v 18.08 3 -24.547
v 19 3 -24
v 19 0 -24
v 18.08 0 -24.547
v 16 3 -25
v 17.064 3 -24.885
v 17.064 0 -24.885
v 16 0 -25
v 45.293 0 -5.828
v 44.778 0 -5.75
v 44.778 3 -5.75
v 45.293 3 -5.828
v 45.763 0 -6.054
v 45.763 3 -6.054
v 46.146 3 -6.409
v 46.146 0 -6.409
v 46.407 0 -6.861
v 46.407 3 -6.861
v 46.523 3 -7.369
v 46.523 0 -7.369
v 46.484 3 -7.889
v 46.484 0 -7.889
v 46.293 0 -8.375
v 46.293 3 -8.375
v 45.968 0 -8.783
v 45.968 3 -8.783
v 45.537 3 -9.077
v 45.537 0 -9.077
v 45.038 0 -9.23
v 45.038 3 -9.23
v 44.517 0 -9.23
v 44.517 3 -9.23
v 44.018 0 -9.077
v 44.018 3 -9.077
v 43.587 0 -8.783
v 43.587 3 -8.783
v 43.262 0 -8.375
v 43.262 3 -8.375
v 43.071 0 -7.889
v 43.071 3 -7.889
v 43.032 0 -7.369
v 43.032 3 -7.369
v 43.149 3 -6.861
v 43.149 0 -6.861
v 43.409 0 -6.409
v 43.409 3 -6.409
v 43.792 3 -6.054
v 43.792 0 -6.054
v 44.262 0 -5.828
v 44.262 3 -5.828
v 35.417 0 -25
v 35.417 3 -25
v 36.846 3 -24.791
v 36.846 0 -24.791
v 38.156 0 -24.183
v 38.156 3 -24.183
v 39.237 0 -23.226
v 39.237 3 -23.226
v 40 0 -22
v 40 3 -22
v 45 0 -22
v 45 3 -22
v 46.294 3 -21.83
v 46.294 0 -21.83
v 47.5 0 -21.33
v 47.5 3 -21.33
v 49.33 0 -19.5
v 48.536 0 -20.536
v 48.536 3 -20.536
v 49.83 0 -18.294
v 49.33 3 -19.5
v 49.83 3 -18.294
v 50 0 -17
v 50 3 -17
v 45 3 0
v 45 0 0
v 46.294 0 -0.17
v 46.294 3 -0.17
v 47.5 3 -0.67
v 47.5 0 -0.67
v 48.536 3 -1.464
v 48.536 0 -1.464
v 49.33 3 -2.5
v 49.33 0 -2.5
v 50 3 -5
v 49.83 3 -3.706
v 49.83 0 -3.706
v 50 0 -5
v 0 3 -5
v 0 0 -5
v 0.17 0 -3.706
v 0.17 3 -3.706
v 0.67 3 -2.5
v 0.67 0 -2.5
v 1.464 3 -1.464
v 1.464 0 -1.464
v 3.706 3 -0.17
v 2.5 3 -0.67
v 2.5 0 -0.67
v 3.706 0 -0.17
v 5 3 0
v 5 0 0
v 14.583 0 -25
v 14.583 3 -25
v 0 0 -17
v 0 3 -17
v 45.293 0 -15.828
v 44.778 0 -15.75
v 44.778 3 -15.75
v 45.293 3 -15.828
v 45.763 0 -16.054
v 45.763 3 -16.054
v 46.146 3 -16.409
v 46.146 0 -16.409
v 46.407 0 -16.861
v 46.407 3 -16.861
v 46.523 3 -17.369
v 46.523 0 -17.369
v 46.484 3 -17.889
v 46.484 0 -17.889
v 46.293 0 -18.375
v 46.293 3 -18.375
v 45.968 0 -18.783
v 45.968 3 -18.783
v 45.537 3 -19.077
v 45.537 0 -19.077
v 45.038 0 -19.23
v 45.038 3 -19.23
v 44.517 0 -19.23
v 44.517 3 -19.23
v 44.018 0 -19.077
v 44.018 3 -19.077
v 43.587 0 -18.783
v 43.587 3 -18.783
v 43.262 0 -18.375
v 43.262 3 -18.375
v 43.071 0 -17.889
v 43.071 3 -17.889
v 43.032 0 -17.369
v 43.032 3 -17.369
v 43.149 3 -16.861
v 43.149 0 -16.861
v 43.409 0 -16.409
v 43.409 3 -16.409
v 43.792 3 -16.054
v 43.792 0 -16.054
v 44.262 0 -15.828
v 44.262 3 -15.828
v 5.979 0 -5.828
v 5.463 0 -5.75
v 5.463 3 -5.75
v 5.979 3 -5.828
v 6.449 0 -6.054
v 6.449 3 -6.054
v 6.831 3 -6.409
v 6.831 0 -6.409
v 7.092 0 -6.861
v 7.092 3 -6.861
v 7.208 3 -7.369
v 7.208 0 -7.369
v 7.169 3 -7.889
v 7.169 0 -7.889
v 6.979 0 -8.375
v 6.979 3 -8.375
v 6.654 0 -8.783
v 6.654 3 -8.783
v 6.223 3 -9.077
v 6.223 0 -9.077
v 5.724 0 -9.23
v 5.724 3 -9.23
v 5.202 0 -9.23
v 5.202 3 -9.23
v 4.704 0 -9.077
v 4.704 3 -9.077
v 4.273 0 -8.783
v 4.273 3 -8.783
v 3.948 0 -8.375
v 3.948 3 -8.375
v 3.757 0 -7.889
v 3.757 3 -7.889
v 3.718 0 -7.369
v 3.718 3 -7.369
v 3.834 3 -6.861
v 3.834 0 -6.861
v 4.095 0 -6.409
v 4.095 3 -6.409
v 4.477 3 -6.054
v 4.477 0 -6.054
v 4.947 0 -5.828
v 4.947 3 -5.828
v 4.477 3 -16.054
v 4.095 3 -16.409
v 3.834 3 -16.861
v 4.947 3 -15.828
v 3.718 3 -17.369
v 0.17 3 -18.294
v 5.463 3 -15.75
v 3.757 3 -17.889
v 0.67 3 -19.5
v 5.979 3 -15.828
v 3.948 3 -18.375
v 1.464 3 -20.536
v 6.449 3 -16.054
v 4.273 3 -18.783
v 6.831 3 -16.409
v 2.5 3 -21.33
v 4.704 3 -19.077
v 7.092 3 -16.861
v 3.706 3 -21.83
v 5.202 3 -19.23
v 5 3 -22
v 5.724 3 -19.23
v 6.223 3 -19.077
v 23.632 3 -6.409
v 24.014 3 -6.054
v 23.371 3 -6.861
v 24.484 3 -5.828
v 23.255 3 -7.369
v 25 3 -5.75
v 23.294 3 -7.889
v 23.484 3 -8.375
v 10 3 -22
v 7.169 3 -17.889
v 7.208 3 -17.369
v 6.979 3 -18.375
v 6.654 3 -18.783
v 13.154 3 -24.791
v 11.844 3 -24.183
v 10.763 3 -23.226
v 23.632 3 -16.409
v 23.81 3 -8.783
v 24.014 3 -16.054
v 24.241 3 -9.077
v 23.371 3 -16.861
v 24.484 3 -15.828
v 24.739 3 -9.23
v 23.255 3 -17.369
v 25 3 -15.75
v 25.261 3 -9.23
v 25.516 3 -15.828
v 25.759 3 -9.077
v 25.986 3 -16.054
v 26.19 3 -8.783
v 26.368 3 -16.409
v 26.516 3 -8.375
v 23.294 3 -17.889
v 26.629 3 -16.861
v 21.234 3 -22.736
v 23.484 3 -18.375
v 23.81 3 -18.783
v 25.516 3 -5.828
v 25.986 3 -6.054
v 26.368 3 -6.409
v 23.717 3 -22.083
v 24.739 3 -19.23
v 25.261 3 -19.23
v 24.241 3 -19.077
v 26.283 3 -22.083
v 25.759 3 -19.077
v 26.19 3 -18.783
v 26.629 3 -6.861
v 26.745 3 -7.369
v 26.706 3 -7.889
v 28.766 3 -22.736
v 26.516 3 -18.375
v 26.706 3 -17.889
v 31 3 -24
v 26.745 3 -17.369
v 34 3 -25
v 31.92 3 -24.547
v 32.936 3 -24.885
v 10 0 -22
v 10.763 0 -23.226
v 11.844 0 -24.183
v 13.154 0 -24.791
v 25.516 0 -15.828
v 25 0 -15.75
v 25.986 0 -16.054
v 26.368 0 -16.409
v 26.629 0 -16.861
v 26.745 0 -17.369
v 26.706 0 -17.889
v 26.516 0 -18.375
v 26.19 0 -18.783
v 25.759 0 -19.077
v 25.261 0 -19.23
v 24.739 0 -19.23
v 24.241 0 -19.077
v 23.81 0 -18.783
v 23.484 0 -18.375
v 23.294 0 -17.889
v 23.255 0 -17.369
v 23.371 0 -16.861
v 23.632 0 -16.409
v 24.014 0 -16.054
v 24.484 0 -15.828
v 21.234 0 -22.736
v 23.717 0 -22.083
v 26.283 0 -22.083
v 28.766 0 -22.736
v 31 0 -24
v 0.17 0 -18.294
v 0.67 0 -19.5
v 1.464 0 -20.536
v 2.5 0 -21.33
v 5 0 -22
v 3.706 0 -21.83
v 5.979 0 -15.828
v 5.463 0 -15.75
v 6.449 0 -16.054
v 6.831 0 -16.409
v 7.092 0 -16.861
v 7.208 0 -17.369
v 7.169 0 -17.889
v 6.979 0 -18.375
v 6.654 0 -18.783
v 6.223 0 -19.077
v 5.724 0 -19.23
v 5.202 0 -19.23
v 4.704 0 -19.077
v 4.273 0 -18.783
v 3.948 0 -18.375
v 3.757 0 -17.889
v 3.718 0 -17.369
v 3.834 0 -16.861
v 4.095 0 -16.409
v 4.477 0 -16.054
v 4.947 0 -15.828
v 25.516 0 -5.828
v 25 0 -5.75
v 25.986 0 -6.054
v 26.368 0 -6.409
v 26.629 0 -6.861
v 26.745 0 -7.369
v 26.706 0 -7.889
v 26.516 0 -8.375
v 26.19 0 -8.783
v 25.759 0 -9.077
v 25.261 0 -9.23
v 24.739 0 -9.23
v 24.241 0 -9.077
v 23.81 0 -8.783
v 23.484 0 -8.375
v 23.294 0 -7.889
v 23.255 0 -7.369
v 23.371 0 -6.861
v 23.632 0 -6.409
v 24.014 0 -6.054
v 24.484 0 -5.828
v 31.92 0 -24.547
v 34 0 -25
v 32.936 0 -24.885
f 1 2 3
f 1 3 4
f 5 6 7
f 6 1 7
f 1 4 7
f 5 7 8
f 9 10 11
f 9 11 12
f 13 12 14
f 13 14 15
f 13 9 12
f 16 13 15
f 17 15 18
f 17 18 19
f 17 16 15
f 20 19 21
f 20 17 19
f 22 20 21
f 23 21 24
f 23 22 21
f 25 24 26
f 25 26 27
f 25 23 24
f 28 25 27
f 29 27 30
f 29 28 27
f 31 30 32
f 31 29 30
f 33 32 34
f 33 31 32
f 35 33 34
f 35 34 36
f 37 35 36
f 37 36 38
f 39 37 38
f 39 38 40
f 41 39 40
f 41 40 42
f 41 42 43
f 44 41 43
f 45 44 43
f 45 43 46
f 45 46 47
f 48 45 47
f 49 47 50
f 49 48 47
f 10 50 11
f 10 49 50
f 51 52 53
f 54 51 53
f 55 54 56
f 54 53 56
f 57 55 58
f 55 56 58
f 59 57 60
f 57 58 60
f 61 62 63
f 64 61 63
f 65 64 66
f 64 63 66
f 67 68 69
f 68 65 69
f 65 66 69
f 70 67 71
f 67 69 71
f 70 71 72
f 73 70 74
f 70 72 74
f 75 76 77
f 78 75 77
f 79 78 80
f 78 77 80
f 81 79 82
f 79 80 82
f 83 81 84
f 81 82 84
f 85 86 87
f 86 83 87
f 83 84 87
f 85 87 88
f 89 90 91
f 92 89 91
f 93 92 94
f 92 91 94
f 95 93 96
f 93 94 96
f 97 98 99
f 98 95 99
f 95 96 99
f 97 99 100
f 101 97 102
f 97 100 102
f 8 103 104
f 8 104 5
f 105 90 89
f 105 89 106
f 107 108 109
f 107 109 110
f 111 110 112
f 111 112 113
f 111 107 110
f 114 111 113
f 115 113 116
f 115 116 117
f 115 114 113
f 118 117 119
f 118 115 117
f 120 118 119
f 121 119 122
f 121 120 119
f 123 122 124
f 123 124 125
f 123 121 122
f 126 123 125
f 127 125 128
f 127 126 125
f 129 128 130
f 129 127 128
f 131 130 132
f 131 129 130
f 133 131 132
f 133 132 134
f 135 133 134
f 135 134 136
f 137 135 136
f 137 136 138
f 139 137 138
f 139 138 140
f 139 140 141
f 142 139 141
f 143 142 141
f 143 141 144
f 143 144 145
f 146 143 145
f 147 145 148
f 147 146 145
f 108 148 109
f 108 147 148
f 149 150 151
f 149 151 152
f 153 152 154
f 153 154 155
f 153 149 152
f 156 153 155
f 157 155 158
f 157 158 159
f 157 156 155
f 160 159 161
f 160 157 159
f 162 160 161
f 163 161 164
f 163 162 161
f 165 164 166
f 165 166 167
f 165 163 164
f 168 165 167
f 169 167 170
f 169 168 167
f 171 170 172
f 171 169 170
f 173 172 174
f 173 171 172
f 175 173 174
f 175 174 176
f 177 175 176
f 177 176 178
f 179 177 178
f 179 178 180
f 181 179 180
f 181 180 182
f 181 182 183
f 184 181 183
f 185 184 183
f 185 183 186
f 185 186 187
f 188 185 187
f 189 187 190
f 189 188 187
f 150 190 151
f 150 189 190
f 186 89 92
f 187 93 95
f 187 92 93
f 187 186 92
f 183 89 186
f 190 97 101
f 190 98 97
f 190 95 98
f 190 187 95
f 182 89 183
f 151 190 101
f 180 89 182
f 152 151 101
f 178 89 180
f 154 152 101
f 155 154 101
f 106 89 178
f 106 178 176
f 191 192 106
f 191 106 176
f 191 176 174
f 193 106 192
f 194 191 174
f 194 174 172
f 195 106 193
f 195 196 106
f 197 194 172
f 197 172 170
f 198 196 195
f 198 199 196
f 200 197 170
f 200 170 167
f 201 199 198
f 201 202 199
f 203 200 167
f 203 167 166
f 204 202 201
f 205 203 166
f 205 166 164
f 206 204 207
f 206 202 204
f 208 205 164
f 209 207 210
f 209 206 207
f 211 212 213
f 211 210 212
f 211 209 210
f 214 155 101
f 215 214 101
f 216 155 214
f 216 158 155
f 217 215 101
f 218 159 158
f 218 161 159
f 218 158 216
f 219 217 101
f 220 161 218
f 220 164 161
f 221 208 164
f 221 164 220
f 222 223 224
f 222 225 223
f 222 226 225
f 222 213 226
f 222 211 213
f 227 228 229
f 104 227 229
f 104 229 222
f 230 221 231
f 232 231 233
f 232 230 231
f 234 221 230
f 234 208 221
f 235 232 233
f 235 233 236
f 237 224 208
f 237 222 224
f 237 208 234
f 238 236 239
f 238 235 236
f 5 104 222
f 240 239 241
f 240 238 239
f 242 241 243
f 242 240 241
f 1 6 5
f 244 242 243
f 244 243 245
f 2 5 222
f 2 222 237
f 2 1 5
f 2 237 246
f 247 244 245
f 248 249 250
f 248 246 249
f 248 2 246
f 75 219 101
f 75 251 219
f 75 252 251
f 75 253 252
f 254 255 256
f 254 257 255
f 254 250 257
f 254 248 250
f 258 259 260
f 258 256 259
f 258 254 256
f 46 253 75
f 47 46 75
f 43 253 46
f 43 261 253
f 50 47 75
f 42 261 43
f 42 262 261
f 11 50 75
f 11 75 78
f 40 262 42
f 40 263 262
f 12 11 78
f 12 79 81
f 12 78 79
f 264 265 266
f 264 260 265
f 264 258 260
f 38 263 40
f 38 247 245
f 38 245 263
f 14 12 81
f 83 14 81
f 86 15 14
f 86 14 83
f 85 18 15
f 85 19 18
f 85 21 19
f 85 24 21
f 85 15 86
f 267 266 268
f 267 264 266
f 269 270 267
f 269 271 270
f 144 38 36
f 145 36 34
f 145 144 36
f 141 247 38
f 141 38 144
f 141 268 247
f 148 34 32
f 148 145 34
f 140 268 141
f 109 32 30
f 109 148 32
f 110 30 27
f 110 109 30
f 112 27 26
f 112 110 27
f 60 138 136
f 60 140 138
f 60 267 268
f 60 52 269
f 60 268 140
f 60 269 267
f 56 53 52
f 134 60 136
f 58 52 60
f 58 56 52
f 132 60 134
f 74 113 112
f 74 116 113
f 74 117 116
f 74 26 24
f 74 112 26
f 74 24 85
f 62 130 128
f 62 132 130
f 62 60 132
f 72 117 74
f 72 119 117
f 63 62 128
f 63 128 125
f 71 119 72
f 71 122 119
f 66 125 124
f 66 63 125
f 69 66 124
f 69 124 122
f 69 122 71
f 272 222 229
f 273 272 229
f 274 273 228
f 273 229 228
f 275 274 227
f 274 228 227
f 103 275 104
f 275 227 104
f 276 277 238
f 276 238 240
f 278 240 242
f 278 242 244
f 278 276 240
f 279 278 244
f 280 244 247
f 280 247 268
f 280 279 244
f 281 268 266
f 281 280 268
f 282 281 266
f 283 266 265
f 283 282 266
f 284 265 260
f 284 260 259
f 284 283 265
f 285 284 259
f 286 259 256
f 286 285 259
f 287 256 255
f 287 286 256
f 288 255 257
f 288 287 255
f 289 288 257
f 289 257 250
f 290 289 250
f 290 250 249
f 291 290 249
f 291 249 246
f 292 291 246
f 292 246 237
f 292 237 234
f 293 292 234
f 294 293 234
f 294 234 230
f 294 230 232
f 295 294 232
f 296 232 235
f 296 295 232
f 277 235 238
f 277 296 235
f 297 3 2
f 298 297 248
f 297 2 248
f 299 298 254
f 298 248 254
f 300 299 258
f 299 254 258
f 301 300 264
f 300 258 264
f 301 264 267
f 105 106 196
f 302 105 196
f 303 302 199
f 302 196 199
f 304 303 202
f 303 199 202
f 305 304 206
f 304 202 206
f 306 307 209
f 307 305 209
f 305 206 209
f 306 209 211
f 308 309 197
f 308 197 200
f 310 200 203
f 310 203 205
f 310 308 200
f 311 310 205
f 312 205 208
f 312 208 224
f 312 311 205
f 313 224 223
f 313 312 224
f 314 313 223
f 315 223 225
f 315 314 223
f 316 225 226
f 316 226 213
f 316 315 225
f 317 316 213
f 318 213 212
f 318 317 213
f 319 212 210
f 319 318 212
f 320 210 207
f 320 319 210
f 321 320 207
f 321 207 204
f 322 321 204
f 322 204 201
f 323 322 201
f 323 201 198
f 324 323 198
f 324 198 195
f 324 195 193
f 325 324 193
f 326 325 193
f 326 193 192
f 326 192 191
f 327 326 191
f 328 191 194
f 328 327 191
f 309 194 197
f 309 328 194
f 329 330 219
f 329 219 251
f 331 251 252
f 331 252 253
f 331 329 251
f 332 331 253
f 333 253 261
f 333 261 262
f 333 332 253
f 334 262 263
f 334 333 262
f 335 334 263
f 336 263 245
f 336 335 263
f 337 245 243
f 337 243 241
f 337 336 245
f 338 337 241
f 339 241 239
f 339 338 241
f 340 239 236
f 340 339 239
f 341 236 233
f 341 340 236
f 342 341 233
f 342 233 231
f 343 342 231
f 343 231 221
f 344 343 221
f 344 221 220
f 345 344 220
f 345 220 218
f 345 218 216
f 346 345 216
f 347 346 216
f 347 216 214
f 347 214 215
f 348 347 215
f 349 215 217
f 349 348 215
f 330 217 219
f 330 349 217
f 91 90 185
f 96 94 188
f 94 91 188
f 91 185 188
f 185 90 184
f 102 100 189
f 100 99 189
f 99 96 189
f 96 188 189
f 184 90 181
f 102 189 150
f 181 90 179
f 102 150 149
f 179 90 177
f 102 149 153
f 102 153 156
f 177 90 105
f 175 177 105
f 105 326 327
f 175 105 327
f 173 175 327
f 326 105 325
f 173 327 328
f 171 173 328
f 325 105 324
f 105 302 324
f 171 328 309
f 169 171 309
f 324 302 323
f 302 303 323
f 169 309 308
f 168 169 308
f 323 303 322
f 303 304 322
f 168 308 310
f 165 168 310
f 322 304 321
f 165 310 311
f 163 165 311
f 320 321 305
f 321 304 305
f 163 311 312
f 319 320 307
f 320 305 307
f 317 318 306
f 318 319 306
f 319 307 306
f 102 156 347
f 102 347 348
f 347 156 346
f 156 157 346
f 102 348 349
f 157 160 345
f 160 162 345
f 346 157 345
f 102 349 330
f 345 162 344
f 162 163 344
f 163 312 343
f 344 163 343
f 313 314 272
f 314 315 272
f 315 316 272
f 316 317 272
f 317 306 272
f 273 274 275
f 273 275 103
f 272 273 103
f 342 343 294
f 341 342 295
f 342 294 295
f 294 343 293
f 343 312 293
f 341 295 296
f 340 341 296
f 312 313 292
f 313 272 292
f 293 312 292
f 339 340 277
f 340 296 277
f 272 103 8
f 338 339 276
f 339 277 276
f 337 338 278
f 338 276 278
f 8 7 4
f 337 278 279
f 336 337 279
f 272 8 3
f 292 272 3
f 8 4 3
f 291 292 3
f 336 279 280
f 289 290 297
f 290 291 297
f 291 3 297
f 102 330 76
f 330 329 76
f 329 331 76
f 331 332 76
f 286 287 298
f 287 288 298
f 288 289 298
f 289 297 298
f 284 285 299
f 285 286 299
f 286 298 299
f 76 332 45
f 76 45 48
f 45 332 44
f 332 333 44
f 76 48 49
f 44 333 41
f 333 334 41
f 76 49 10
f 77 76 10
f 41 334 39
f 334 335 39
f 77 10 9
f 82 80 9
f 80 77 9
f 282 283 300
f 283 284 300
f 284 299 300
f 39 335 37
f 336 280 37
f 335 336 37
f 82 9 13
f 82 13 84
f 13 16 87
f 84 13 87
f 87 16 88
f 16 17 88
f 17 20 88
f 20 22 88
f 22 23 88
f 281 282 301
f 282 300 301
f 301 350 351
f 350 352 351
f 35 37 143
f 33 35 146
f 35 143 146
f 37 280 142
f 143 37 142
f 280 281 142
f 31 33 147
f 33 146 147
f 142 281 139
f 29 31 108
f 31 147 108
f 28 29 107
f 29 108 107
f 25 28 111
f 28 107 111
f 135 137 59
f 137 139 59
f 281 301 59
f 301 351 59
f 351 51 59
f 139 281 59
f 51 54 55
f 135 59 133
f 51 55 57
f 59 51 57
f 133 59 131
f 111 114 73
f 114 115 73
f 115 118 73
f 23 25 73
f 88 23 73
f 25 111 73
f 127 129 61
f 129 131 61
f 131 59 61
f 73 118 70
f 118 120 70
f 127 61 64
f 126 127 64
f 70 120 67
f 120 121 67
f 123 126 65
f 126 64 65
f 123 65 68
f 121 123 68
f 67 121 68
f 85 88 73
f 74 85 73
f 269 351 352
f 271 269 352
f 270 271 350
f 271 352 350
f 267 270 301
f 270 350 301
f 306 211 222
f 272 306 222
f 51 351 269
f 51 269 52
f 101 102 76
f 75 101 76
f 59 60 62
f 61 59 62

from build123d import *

# Parameters (mm, degrees)
SKETCH1_W           = 50
SKETCH1_H           = 25
SKETCH1_R           = 1.75
BOSS_EXTRUDE1_DEPTH = 3
SKETCH2_R           = 10
SKETCH2_W           = 10
SKETCH2_H           = 3
CUT_EXTRUDE1_DEPTH  = 10
FILLET1_R           = 5


with BuildPart() as part:
    # Sketch1 → Boss-Extrude1 (new body)
    with BuildSketch(Plane(origin=(0, 0, 0), x_dir=(1, 0, 0), z_dir=(0, 1, 0))):
        with Locations((25, 12.5)):
            Rectangle(SKETCH1_W, SKETCH1_H)
        with Locations(Location((25, 17.5, 0), (0, 0, 270))):
            Circle(SKETCH1_R, mode=Mode.SUBTRACT)
        with Locations(Location((25, 7.5, 0), (0, 0, 270))):
            Circle(SKETCH1_R, mode=Mode.SUBTRACT)
        with Locations(Location((5.463236706, 17.5, 0), (0, 0, 270))):
            Circle(SKETCH1_R, mode=Mode.SUBTRACT)
        with Locations(Location((5.463236706, 7.5, 0), (0, 0, 270))):
            Circle(SKETCH1_R, mode=Mode.SUBTRACT)
        with Locations(Location((44.777570027, 7.5, 0), (0, 0, 270))):
            Circle(SKETCH1_R, mode=Mode.SUBTRACT)
        with Locations(Location((44.777570027, 17.5, 0), (0, 0, 270))):
            Circle(SKETCH1_R, mode=Mode.SUBTRACT)
    extrude(amount=BOSS_EXTRUDE1_DEPTH)

    # Sketch2 → Cut-Extrude1 (cut)
    with BuildSketch(Plane(origin=(0, 3, 0), x_dir=(1, 0, 0), z_dir=(0, 1, 0))):
        with Locations((25, 32)):
            Circle(SKETCH2_R)
        with Locations((5, 23.5)):
            Rectangle(SKETCH2_W, SKETCH2_H)
        with Locations((45, 23.5)):
            Rectangle(SKETCH2_W, SKETCH2_H)
    extrude(amount=-CUT_EXTRUDE1_DEPTH, mode=Mode.SUBTRACT)

    # Fillet1
    # the kernel refuses this fillet: 5 mm, written as the material it takes off along each edge
    with BuildSketch(Plane(origin=(50, -12.5, 0), x_dir=(-1, 0, 0), z_dir=(0, 1, 0)), Plane(origin=(0, 15.5, -22), x_dir=(0, 0, 1), z_dir=(0, -1, 0))) as fillet1_piece_1:
        with BuildLine():
            CenterArc((FILLET1_R, -FILLET1_R), FILLET1_R, 90, 90)
            Line((0, -FILLET1_R), (-FILLET1_R * 0.02, -FILLET1_R))
            Line((-FILLET1_R * 0.02, -FILLET1_R), (-FILLET1_R * 0.02, FILLET1_R * 0.02))
            Line((-FILLET1_R * 0.02, FILLET1_R * 0.02), (FILLET1_R, FILLET1_R * 0.02))
            Line((FILLET1_R, FILLET1_R * 0.02), (FILLET1_R, 0))
        make_face()
    extrude(amount=28, mode=Mode.SUBTRACT)
    with BuildSketch(Plane(origin=(0, -12.5, 0), x_dir=(1, 0, 0), z_dir=(0, 1, 0)), Plane(origin=(50, 15.5, -22), x_dir=(0, 0, 1), z_dir=(0, -1, 0))) as fillet1_piece_2:
        with BuildLine():
            CenterArc((FILLET1_R, FILLET1_R), FILLET1_R, 180, 90)
            Line((0, FILLET1_R), (-FILLET1_R * 0.02, FILLET1_R))
            Line((-FILLET1_R * 0.02, FILLET1_R), (-FILLET1_R * 0.02, -FILLET1_R * 0.02))
            Line((-FILLET1_R * 0.02, -FILLET1_R * 0.02), (FILLET1_R, -FILLET1_R * 0.02))
            Line((FILLET1_R, -FILLET1_R * 0.02), (FILLET1_R, 0))
        make_face()
    extrude(amount=28, mode=Mode.SUBTRACT)
    with BuildSketch(Plane(origin=(40, 14.456439237, -25), x_dir=(-1, 0, 0), z_dir=(0, -1, 0))) as fillet1_piece_3:
        with BuildLine():
            CenterArc((4.582575695, -5), FILLET1_R, 90, 66.421821522)
            Line((0, -3), (-0.091651514, -2.96))
            ThreePointArc((-0.091651514, -2.96), (-0.1, -1.5), (-0.1, 0))
            Line((-0.1, 0), (0, 0.1))
            Line((0, 0.1), (4.582575695, 0.1))
            Line((4.582575695, 0.1), (4.582575695, 0))
        make_face()
    extrude(amount=25.912878475, mode=Mode.SUBTRACT)
    with BuildSketch(Plane(origin=(10, 14.456439237, -25), x_dir=(0, 0, 1), z_dir=(0, -1, 0))) as fillet1_piece_4:
        with BuildLine():
            CenterArc((5, -4.582575695), FILLET1_R, 113.578178478, 66.421821522)
            Line((0, -4.582575695), (-0.1, -4.582575695))
            Line((-0.1, -4.582575695), (-0.1, 0))
            Line((-0.1, 0), (0, 0.1))
            ThreePointArc((0, 0.1), (1.5, 0.1), (2.96, 0.091651514))
            Line((2.96, 0.091651514), (3, 0))
        make_face()
    extrude(amount=25.912878475, mode=Mode.SUBTRACT)
    with BuildSketch(Plane(origin=(17.858571571, -4.646428929, -25), x_dir=(-1, 0, 0), z_dir=(0, 1, 0))) as fillet1_piece_5:
        with BuildLine():
            CenterArc((1.858571571, 5), FILLET1_R, 233.130102354, 36.869897646)
            Line((-1.141428429, 1), (-1.201428429, 0.92))
            ThreePointArc((-1.201428429, 0.92), (-0.617614973, 0.446466141), (-0.071414284, -0.07))
            Line((-0.071414284, -0.07), (0, -0.1))
            Line((0, -0.1), (1.858571571, -0.1))
            Line((1.858571571, -0.1), (1.858571571, 0))
        make_face()
    extrude(amount=12.292857857, mode=Mode.SUBTRACT)
    with BuildSketch(Plane(origin=(32.141428429, -4.646428929, -25), x_dir=(-0.7521682970876359, 0, 0.658971056159742), z_dir=(0, 1, 0))) as fillet1_piece_6:
        with BuildLine():
            CenterArc((1.896896667, 4.985586357), FILLET1_R, 228.778553177, 36.869897646)
            Line((-1.397958614, 1.224744871), (-1.46385572, 1.149528042))
            Line((-1.46385572, 1.149528042), (-0.065897106, -0.07521683))
            Line((-0.065897106, -0.07521683), (0.007587587, -0.099711727))
            ThreePointArc((0.007587587, -0.099711727), (0.758758667, -0.071172714), (1.509929747, -0.099711727))
            Line((1.509929747, -0.099711727), (1.517517334, 0))
        make_face()
    extrude(amount=12.292857857, mode=Mode.SUBTRACT)


solid = part.part
